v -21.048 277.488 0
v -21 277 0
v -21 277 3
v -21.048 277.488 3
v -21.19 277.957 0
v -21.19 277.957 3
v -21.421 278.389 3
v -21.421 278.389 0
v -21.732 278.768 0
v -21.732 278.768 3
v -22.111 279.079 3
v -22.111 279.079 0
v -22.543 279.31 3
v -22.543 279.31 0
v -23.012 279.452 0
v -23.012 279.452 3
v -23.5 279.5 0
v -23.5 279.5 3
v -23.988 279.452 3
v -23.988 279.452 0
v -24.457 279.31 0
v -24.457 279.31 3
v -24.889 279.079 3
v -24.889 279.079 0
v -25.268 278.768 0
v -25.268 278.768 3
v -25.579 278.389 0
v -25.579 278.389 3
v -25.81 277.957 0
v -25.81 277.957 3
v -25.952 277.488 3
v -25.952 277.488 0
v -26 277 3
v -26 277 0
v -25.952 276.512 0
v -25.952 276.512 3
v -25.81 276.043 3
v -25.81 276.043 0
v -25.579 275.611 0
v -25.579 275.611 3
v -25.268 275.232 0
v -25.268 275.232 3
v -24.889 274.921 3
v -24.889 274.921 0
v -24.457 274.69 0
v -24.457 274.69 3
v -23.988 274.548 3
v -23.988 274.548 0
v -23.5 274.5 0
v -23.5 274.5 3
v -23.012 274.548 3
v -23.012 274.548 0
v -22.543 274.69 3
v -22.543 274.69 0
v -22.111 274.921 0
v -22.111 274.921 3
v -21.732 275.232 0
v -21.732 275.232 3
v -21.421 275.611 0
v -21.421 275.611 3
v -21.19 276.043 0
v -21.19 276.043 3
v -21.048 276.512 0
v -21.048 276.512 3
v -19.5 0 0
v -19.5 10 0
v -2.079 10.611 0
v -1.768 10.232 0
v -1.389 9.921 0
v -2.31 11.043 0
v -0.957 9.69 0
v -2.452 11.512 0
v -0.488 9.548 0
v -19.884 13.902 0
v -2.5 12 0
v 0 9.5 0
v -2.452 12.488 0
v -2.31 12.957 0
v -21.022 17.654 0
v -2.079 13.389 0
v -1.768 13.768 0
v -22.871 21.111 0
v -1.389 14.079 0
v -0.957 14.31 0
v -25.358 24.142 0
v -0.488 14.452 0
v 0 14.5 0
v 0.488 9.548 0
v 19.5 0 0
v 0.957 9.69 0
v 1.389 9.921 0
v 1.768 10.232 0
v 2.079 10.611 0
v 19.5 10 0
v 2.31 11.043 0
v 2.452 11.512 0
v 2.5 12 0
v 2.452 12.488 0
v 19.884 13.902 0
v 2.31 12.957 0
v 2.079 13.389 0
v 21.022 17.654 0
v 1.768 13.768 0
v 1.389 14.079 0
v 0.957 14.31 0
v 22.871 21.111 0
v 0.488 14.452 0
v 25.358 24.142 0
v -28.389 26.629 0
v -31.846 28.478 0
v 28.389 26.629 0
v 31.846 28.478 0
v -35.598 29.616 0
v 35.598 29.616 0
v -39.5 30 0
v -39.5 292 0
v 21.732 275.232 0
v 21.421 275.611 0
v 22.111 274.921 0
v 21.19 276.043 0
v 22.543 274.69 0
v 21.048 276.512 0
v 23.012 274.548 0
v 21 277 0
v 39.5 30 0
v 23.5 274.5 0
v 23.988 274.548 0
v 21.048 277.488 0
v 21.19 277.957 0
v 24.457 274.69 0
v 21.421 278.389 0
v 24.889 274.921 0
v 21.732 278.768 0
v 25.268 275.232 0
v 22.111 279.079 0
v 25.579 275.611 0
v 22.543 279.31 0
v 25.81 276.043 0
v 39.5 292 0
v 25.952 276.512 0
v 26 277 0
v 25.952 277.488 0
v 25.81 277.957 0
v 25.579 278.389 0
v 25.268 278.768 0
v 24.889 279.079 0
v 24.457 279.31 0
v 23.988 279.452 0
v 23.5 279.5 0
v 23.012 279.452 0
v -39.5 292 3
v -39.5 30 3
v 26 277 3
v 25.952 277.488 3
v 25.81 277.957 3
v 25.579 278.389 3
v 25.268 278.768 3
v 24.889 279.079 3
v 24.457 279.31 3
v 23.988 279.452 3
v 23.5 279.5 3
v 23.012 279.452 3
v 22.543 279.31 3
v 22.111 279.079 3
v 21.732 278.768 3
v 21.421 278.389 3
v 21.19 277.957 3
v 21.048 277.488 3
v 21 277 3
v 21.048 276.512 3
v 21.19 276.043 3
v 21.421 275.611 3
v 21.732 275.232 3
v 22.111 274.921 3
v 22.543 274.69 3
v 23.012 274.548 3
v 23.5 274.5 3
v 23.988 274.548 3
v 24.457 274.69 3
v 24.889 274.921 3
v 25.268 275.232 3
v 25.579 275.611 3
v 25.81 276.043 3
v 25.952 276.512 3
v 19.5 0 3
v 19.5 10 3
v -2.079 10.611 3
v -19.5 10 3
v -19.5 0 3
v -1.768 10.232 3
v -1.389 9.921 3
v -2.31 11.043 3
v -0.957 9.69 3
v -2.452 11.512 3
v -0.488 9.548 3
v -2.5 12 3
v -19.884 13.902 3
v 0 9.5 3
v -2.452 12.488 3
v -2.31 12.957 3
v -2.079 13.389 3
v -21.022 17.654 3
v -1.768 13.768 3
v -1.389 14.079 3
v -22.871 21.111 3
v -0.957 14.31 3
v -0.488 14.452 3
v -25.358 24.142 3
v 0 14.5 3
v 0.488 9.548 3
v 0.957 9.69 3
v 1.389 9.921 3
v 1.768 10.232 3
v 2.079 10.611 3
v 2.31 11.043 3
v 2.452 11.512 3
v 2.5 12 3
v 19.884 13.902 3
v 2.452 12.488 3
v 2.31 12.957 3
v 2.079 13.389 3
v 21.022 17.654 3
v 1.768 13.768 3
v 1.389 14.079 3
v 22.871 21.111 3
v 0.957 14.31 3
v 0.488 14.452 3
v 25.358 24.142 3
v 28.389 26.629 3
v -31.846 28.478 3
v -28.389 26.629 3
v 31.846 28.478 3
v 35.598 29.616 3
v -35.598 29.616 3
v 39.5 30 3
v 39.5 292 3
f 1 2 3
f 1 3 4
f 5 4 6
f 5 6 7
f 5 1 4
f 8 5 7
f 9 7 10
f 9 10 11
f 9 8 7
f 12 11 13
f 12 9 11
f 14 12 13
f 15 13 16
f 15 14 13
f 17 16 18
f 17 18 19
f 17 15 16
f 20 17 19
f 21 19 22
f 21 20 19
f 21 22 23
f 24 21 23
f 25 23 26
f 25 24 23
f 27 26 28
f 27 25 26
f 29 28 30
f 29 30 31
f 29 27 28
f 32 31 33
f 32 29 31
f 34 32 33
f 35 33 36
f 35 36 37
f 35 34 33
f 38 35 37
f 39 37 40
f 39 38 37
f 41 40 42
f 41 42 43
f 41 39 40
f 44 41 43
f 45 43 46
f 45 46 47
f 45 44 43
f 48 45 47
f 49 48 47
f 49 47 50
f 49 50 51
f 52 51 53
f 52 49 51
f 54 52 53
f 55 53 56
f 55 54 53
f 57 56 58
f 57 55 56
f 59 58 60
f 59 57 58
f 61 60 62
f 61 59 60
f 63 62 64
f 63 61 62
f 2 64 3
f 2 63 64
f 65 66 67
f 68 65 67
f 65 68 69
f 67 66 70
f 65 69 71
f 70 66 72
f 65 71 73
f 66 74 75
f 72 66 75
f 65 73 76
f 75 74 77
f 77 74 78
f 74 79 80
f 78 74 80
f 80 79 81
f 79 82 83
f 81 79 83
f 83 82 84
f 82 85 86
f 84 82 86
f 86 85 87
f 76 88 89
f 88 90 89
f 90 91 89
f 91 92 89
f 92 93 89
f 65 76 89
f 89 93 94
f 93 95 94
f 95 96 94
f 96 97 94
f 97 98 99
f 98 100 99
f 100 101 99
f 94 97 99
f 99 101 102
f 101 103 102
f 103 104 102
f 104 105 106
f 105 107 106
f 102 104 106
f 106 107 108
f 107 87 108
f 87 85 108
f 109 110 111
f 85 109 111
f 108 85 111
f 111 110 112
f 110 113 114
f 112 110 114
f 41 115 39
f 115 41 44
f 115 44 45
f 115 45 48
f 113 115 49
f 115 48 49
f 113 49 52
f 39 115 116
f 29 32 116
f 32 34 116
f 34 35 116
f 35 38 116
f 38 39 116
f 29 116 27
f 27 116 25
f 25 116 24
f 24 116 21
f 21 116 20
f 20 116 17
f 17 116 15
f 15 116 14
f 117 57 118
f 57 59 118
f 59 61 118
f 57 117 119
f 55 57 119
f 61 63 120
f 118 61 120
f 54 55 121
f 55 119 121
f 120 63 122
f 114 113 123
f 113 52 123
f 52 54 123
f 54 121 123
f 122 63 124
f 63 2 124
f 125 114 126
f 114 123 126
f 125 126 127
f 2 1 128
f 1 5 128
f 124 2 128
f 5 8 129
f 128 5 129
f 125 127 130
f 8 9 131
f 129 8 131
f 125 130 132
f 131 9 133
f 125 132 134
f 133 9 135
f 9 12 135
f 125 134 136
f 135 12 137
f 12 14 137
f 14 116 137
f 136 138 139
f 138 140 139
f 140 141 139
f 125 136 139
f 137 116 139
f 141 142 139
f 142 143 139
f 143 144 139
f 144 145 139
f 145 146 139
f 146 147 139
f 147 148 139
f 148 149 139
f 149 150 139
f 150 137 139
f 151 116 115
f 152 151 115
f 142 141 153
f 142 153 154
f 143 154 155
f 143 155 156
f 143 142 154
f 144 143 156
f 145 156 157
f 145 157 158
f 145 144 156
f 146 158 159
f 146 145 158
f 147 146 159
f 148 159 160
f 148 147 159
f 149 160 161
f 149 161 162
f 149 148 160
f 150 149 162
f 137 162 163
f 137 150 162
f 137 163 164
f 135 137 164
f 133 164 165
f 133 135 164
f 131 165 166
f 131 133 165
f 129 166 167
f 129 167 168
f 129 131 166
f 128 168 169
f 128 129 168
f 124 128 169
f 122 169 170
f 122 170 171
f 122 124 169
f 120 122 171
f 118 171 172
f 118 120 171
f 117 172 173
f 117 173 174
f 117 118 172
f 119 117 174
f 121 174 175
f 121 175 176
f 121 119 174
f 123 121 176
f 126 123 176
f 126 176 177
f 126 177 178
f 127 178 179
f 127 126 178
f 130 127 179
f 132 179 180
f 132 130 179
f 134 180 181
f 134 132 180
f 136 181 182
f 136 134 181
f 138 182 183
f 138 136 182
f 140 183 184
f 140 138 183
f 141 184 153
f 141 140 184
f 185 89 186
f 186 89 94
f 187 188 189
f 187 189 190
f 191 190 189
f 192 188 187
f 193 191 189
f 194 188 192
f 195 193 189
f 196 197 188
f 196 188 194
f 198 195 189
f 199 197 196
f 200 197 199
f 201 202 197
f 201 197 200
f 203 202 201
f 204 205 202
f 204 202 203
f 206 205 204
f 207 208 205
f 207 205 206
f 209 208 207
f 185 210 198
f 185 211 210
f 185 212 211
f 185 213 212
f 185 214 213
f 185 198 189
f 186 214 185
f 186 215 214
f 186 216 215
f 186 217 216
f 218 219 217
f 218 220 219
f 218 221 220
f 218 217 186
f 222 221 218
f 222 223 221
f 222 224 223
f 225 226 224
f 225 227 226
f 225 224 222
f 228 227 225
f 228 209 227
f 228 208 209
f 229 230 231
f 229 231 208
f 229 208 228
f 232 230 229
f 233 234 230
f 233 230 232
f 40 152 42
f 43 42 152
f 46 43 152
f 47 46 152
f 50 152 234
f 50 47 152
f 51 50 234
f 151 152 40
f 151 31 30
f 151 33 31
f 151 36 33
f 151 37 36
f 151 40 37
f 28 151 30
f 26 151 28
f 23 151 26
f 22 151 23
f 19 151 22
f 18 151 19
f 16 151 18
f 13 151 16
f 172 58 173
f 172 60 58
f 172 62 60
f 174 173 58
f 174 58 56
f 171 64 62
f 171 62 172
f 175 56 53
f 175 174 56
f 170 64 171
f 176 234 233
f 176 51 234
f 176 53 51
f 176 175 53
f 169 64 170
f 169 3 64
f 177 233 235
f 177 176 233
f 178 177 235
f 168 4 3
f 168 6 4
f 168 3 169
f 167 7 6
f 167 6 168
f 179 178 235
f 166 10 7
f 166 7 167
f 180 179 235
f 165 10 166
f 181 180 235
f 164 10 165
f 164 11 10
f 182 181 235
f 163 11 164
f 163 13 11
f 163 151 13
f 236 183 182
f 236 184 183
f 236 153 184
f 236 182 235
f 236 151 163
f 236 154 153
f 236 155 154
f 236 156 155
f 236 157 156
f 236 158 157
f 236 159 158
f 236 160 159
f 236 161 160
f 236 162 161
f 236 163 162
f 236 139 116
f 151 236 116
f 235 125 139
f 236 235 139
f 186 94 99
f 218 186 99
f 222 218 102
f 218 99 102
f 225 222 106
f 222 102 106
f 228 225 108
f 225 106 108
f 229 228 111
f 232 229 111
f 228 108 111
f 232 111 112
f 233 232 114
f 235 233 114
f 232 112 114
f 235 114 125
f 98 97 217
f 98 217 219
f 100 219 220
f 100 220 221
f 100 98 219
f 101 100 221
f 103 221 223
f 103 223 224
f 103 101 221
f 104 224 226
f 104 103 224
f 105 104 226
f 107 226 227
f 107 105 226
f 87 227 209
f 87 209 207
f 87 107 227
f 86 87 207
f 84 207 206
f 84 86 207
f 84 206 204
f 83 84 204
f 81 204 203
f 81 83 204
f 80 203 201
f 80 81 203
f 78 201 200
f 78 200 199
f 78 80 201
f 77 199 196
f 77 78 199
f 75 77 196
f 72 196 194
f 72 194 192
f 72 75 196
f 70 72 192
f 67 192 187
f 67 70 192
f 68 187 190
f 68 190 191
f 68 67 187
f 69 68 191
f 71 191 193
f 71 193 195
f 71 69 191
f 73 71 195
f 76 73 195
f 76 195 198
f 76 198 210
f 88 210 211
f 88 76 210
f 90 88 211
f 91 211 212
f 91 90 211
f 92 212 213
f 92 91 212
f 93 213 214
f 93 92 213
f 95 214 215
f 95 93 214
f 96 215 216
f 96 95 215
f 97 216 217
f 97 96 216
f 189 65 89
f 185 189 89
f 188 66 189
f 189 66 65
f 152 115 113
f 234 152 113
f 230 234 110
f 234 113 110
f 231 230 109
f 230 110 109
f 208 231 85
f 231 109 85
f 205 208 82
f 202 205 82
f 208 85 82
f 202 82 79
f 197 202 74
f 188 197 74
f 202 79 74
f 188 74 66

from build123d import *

# Parameters (mm, degrees)
ESQUISSE1_R      = 2.5
EXTRUSION1_DEPTH = 3


with BuildPart() as part:
    # Esquisse1 → Extrusion1 (new body)
    with BuildSketch(Plane.XY):
        with BuildLine():
            Line((39.5, 292), (-39.5, 292))
            Line((-39.5, 292), (-39.5, 30))
            ThreePointArc((-39.5, 30), (-25.357864376, 24.142135624), (-19.5, 10))
            Line((-19.5, 10), (-19.5, 0))
            Line((-19.5, 0), (19.5, 0))
            Line((19.5, 0), (19.5, 10))
            ThreePointArc((19.5, 10), (25.357864376, 24.142135624), (39.5, 30))
            Line((39.5, 30), (39.5, 292))
        make_face()
        with Locations((-23.5, 277)):
            Circle(ESQUISSE1_R, mode=Mode.SUBTRACT)
        with Locations((23.5, 277)):
            Circle(ESQUISSE1_R, mode=Mode.SUBTRACT)
        with Locations((0, 12)):
            Circle(ESQUISSE1_R, mode=Mode.SUBTRACT)
    extrude(amount=EXTRUSION1_DEPTH)


solid = part.part
